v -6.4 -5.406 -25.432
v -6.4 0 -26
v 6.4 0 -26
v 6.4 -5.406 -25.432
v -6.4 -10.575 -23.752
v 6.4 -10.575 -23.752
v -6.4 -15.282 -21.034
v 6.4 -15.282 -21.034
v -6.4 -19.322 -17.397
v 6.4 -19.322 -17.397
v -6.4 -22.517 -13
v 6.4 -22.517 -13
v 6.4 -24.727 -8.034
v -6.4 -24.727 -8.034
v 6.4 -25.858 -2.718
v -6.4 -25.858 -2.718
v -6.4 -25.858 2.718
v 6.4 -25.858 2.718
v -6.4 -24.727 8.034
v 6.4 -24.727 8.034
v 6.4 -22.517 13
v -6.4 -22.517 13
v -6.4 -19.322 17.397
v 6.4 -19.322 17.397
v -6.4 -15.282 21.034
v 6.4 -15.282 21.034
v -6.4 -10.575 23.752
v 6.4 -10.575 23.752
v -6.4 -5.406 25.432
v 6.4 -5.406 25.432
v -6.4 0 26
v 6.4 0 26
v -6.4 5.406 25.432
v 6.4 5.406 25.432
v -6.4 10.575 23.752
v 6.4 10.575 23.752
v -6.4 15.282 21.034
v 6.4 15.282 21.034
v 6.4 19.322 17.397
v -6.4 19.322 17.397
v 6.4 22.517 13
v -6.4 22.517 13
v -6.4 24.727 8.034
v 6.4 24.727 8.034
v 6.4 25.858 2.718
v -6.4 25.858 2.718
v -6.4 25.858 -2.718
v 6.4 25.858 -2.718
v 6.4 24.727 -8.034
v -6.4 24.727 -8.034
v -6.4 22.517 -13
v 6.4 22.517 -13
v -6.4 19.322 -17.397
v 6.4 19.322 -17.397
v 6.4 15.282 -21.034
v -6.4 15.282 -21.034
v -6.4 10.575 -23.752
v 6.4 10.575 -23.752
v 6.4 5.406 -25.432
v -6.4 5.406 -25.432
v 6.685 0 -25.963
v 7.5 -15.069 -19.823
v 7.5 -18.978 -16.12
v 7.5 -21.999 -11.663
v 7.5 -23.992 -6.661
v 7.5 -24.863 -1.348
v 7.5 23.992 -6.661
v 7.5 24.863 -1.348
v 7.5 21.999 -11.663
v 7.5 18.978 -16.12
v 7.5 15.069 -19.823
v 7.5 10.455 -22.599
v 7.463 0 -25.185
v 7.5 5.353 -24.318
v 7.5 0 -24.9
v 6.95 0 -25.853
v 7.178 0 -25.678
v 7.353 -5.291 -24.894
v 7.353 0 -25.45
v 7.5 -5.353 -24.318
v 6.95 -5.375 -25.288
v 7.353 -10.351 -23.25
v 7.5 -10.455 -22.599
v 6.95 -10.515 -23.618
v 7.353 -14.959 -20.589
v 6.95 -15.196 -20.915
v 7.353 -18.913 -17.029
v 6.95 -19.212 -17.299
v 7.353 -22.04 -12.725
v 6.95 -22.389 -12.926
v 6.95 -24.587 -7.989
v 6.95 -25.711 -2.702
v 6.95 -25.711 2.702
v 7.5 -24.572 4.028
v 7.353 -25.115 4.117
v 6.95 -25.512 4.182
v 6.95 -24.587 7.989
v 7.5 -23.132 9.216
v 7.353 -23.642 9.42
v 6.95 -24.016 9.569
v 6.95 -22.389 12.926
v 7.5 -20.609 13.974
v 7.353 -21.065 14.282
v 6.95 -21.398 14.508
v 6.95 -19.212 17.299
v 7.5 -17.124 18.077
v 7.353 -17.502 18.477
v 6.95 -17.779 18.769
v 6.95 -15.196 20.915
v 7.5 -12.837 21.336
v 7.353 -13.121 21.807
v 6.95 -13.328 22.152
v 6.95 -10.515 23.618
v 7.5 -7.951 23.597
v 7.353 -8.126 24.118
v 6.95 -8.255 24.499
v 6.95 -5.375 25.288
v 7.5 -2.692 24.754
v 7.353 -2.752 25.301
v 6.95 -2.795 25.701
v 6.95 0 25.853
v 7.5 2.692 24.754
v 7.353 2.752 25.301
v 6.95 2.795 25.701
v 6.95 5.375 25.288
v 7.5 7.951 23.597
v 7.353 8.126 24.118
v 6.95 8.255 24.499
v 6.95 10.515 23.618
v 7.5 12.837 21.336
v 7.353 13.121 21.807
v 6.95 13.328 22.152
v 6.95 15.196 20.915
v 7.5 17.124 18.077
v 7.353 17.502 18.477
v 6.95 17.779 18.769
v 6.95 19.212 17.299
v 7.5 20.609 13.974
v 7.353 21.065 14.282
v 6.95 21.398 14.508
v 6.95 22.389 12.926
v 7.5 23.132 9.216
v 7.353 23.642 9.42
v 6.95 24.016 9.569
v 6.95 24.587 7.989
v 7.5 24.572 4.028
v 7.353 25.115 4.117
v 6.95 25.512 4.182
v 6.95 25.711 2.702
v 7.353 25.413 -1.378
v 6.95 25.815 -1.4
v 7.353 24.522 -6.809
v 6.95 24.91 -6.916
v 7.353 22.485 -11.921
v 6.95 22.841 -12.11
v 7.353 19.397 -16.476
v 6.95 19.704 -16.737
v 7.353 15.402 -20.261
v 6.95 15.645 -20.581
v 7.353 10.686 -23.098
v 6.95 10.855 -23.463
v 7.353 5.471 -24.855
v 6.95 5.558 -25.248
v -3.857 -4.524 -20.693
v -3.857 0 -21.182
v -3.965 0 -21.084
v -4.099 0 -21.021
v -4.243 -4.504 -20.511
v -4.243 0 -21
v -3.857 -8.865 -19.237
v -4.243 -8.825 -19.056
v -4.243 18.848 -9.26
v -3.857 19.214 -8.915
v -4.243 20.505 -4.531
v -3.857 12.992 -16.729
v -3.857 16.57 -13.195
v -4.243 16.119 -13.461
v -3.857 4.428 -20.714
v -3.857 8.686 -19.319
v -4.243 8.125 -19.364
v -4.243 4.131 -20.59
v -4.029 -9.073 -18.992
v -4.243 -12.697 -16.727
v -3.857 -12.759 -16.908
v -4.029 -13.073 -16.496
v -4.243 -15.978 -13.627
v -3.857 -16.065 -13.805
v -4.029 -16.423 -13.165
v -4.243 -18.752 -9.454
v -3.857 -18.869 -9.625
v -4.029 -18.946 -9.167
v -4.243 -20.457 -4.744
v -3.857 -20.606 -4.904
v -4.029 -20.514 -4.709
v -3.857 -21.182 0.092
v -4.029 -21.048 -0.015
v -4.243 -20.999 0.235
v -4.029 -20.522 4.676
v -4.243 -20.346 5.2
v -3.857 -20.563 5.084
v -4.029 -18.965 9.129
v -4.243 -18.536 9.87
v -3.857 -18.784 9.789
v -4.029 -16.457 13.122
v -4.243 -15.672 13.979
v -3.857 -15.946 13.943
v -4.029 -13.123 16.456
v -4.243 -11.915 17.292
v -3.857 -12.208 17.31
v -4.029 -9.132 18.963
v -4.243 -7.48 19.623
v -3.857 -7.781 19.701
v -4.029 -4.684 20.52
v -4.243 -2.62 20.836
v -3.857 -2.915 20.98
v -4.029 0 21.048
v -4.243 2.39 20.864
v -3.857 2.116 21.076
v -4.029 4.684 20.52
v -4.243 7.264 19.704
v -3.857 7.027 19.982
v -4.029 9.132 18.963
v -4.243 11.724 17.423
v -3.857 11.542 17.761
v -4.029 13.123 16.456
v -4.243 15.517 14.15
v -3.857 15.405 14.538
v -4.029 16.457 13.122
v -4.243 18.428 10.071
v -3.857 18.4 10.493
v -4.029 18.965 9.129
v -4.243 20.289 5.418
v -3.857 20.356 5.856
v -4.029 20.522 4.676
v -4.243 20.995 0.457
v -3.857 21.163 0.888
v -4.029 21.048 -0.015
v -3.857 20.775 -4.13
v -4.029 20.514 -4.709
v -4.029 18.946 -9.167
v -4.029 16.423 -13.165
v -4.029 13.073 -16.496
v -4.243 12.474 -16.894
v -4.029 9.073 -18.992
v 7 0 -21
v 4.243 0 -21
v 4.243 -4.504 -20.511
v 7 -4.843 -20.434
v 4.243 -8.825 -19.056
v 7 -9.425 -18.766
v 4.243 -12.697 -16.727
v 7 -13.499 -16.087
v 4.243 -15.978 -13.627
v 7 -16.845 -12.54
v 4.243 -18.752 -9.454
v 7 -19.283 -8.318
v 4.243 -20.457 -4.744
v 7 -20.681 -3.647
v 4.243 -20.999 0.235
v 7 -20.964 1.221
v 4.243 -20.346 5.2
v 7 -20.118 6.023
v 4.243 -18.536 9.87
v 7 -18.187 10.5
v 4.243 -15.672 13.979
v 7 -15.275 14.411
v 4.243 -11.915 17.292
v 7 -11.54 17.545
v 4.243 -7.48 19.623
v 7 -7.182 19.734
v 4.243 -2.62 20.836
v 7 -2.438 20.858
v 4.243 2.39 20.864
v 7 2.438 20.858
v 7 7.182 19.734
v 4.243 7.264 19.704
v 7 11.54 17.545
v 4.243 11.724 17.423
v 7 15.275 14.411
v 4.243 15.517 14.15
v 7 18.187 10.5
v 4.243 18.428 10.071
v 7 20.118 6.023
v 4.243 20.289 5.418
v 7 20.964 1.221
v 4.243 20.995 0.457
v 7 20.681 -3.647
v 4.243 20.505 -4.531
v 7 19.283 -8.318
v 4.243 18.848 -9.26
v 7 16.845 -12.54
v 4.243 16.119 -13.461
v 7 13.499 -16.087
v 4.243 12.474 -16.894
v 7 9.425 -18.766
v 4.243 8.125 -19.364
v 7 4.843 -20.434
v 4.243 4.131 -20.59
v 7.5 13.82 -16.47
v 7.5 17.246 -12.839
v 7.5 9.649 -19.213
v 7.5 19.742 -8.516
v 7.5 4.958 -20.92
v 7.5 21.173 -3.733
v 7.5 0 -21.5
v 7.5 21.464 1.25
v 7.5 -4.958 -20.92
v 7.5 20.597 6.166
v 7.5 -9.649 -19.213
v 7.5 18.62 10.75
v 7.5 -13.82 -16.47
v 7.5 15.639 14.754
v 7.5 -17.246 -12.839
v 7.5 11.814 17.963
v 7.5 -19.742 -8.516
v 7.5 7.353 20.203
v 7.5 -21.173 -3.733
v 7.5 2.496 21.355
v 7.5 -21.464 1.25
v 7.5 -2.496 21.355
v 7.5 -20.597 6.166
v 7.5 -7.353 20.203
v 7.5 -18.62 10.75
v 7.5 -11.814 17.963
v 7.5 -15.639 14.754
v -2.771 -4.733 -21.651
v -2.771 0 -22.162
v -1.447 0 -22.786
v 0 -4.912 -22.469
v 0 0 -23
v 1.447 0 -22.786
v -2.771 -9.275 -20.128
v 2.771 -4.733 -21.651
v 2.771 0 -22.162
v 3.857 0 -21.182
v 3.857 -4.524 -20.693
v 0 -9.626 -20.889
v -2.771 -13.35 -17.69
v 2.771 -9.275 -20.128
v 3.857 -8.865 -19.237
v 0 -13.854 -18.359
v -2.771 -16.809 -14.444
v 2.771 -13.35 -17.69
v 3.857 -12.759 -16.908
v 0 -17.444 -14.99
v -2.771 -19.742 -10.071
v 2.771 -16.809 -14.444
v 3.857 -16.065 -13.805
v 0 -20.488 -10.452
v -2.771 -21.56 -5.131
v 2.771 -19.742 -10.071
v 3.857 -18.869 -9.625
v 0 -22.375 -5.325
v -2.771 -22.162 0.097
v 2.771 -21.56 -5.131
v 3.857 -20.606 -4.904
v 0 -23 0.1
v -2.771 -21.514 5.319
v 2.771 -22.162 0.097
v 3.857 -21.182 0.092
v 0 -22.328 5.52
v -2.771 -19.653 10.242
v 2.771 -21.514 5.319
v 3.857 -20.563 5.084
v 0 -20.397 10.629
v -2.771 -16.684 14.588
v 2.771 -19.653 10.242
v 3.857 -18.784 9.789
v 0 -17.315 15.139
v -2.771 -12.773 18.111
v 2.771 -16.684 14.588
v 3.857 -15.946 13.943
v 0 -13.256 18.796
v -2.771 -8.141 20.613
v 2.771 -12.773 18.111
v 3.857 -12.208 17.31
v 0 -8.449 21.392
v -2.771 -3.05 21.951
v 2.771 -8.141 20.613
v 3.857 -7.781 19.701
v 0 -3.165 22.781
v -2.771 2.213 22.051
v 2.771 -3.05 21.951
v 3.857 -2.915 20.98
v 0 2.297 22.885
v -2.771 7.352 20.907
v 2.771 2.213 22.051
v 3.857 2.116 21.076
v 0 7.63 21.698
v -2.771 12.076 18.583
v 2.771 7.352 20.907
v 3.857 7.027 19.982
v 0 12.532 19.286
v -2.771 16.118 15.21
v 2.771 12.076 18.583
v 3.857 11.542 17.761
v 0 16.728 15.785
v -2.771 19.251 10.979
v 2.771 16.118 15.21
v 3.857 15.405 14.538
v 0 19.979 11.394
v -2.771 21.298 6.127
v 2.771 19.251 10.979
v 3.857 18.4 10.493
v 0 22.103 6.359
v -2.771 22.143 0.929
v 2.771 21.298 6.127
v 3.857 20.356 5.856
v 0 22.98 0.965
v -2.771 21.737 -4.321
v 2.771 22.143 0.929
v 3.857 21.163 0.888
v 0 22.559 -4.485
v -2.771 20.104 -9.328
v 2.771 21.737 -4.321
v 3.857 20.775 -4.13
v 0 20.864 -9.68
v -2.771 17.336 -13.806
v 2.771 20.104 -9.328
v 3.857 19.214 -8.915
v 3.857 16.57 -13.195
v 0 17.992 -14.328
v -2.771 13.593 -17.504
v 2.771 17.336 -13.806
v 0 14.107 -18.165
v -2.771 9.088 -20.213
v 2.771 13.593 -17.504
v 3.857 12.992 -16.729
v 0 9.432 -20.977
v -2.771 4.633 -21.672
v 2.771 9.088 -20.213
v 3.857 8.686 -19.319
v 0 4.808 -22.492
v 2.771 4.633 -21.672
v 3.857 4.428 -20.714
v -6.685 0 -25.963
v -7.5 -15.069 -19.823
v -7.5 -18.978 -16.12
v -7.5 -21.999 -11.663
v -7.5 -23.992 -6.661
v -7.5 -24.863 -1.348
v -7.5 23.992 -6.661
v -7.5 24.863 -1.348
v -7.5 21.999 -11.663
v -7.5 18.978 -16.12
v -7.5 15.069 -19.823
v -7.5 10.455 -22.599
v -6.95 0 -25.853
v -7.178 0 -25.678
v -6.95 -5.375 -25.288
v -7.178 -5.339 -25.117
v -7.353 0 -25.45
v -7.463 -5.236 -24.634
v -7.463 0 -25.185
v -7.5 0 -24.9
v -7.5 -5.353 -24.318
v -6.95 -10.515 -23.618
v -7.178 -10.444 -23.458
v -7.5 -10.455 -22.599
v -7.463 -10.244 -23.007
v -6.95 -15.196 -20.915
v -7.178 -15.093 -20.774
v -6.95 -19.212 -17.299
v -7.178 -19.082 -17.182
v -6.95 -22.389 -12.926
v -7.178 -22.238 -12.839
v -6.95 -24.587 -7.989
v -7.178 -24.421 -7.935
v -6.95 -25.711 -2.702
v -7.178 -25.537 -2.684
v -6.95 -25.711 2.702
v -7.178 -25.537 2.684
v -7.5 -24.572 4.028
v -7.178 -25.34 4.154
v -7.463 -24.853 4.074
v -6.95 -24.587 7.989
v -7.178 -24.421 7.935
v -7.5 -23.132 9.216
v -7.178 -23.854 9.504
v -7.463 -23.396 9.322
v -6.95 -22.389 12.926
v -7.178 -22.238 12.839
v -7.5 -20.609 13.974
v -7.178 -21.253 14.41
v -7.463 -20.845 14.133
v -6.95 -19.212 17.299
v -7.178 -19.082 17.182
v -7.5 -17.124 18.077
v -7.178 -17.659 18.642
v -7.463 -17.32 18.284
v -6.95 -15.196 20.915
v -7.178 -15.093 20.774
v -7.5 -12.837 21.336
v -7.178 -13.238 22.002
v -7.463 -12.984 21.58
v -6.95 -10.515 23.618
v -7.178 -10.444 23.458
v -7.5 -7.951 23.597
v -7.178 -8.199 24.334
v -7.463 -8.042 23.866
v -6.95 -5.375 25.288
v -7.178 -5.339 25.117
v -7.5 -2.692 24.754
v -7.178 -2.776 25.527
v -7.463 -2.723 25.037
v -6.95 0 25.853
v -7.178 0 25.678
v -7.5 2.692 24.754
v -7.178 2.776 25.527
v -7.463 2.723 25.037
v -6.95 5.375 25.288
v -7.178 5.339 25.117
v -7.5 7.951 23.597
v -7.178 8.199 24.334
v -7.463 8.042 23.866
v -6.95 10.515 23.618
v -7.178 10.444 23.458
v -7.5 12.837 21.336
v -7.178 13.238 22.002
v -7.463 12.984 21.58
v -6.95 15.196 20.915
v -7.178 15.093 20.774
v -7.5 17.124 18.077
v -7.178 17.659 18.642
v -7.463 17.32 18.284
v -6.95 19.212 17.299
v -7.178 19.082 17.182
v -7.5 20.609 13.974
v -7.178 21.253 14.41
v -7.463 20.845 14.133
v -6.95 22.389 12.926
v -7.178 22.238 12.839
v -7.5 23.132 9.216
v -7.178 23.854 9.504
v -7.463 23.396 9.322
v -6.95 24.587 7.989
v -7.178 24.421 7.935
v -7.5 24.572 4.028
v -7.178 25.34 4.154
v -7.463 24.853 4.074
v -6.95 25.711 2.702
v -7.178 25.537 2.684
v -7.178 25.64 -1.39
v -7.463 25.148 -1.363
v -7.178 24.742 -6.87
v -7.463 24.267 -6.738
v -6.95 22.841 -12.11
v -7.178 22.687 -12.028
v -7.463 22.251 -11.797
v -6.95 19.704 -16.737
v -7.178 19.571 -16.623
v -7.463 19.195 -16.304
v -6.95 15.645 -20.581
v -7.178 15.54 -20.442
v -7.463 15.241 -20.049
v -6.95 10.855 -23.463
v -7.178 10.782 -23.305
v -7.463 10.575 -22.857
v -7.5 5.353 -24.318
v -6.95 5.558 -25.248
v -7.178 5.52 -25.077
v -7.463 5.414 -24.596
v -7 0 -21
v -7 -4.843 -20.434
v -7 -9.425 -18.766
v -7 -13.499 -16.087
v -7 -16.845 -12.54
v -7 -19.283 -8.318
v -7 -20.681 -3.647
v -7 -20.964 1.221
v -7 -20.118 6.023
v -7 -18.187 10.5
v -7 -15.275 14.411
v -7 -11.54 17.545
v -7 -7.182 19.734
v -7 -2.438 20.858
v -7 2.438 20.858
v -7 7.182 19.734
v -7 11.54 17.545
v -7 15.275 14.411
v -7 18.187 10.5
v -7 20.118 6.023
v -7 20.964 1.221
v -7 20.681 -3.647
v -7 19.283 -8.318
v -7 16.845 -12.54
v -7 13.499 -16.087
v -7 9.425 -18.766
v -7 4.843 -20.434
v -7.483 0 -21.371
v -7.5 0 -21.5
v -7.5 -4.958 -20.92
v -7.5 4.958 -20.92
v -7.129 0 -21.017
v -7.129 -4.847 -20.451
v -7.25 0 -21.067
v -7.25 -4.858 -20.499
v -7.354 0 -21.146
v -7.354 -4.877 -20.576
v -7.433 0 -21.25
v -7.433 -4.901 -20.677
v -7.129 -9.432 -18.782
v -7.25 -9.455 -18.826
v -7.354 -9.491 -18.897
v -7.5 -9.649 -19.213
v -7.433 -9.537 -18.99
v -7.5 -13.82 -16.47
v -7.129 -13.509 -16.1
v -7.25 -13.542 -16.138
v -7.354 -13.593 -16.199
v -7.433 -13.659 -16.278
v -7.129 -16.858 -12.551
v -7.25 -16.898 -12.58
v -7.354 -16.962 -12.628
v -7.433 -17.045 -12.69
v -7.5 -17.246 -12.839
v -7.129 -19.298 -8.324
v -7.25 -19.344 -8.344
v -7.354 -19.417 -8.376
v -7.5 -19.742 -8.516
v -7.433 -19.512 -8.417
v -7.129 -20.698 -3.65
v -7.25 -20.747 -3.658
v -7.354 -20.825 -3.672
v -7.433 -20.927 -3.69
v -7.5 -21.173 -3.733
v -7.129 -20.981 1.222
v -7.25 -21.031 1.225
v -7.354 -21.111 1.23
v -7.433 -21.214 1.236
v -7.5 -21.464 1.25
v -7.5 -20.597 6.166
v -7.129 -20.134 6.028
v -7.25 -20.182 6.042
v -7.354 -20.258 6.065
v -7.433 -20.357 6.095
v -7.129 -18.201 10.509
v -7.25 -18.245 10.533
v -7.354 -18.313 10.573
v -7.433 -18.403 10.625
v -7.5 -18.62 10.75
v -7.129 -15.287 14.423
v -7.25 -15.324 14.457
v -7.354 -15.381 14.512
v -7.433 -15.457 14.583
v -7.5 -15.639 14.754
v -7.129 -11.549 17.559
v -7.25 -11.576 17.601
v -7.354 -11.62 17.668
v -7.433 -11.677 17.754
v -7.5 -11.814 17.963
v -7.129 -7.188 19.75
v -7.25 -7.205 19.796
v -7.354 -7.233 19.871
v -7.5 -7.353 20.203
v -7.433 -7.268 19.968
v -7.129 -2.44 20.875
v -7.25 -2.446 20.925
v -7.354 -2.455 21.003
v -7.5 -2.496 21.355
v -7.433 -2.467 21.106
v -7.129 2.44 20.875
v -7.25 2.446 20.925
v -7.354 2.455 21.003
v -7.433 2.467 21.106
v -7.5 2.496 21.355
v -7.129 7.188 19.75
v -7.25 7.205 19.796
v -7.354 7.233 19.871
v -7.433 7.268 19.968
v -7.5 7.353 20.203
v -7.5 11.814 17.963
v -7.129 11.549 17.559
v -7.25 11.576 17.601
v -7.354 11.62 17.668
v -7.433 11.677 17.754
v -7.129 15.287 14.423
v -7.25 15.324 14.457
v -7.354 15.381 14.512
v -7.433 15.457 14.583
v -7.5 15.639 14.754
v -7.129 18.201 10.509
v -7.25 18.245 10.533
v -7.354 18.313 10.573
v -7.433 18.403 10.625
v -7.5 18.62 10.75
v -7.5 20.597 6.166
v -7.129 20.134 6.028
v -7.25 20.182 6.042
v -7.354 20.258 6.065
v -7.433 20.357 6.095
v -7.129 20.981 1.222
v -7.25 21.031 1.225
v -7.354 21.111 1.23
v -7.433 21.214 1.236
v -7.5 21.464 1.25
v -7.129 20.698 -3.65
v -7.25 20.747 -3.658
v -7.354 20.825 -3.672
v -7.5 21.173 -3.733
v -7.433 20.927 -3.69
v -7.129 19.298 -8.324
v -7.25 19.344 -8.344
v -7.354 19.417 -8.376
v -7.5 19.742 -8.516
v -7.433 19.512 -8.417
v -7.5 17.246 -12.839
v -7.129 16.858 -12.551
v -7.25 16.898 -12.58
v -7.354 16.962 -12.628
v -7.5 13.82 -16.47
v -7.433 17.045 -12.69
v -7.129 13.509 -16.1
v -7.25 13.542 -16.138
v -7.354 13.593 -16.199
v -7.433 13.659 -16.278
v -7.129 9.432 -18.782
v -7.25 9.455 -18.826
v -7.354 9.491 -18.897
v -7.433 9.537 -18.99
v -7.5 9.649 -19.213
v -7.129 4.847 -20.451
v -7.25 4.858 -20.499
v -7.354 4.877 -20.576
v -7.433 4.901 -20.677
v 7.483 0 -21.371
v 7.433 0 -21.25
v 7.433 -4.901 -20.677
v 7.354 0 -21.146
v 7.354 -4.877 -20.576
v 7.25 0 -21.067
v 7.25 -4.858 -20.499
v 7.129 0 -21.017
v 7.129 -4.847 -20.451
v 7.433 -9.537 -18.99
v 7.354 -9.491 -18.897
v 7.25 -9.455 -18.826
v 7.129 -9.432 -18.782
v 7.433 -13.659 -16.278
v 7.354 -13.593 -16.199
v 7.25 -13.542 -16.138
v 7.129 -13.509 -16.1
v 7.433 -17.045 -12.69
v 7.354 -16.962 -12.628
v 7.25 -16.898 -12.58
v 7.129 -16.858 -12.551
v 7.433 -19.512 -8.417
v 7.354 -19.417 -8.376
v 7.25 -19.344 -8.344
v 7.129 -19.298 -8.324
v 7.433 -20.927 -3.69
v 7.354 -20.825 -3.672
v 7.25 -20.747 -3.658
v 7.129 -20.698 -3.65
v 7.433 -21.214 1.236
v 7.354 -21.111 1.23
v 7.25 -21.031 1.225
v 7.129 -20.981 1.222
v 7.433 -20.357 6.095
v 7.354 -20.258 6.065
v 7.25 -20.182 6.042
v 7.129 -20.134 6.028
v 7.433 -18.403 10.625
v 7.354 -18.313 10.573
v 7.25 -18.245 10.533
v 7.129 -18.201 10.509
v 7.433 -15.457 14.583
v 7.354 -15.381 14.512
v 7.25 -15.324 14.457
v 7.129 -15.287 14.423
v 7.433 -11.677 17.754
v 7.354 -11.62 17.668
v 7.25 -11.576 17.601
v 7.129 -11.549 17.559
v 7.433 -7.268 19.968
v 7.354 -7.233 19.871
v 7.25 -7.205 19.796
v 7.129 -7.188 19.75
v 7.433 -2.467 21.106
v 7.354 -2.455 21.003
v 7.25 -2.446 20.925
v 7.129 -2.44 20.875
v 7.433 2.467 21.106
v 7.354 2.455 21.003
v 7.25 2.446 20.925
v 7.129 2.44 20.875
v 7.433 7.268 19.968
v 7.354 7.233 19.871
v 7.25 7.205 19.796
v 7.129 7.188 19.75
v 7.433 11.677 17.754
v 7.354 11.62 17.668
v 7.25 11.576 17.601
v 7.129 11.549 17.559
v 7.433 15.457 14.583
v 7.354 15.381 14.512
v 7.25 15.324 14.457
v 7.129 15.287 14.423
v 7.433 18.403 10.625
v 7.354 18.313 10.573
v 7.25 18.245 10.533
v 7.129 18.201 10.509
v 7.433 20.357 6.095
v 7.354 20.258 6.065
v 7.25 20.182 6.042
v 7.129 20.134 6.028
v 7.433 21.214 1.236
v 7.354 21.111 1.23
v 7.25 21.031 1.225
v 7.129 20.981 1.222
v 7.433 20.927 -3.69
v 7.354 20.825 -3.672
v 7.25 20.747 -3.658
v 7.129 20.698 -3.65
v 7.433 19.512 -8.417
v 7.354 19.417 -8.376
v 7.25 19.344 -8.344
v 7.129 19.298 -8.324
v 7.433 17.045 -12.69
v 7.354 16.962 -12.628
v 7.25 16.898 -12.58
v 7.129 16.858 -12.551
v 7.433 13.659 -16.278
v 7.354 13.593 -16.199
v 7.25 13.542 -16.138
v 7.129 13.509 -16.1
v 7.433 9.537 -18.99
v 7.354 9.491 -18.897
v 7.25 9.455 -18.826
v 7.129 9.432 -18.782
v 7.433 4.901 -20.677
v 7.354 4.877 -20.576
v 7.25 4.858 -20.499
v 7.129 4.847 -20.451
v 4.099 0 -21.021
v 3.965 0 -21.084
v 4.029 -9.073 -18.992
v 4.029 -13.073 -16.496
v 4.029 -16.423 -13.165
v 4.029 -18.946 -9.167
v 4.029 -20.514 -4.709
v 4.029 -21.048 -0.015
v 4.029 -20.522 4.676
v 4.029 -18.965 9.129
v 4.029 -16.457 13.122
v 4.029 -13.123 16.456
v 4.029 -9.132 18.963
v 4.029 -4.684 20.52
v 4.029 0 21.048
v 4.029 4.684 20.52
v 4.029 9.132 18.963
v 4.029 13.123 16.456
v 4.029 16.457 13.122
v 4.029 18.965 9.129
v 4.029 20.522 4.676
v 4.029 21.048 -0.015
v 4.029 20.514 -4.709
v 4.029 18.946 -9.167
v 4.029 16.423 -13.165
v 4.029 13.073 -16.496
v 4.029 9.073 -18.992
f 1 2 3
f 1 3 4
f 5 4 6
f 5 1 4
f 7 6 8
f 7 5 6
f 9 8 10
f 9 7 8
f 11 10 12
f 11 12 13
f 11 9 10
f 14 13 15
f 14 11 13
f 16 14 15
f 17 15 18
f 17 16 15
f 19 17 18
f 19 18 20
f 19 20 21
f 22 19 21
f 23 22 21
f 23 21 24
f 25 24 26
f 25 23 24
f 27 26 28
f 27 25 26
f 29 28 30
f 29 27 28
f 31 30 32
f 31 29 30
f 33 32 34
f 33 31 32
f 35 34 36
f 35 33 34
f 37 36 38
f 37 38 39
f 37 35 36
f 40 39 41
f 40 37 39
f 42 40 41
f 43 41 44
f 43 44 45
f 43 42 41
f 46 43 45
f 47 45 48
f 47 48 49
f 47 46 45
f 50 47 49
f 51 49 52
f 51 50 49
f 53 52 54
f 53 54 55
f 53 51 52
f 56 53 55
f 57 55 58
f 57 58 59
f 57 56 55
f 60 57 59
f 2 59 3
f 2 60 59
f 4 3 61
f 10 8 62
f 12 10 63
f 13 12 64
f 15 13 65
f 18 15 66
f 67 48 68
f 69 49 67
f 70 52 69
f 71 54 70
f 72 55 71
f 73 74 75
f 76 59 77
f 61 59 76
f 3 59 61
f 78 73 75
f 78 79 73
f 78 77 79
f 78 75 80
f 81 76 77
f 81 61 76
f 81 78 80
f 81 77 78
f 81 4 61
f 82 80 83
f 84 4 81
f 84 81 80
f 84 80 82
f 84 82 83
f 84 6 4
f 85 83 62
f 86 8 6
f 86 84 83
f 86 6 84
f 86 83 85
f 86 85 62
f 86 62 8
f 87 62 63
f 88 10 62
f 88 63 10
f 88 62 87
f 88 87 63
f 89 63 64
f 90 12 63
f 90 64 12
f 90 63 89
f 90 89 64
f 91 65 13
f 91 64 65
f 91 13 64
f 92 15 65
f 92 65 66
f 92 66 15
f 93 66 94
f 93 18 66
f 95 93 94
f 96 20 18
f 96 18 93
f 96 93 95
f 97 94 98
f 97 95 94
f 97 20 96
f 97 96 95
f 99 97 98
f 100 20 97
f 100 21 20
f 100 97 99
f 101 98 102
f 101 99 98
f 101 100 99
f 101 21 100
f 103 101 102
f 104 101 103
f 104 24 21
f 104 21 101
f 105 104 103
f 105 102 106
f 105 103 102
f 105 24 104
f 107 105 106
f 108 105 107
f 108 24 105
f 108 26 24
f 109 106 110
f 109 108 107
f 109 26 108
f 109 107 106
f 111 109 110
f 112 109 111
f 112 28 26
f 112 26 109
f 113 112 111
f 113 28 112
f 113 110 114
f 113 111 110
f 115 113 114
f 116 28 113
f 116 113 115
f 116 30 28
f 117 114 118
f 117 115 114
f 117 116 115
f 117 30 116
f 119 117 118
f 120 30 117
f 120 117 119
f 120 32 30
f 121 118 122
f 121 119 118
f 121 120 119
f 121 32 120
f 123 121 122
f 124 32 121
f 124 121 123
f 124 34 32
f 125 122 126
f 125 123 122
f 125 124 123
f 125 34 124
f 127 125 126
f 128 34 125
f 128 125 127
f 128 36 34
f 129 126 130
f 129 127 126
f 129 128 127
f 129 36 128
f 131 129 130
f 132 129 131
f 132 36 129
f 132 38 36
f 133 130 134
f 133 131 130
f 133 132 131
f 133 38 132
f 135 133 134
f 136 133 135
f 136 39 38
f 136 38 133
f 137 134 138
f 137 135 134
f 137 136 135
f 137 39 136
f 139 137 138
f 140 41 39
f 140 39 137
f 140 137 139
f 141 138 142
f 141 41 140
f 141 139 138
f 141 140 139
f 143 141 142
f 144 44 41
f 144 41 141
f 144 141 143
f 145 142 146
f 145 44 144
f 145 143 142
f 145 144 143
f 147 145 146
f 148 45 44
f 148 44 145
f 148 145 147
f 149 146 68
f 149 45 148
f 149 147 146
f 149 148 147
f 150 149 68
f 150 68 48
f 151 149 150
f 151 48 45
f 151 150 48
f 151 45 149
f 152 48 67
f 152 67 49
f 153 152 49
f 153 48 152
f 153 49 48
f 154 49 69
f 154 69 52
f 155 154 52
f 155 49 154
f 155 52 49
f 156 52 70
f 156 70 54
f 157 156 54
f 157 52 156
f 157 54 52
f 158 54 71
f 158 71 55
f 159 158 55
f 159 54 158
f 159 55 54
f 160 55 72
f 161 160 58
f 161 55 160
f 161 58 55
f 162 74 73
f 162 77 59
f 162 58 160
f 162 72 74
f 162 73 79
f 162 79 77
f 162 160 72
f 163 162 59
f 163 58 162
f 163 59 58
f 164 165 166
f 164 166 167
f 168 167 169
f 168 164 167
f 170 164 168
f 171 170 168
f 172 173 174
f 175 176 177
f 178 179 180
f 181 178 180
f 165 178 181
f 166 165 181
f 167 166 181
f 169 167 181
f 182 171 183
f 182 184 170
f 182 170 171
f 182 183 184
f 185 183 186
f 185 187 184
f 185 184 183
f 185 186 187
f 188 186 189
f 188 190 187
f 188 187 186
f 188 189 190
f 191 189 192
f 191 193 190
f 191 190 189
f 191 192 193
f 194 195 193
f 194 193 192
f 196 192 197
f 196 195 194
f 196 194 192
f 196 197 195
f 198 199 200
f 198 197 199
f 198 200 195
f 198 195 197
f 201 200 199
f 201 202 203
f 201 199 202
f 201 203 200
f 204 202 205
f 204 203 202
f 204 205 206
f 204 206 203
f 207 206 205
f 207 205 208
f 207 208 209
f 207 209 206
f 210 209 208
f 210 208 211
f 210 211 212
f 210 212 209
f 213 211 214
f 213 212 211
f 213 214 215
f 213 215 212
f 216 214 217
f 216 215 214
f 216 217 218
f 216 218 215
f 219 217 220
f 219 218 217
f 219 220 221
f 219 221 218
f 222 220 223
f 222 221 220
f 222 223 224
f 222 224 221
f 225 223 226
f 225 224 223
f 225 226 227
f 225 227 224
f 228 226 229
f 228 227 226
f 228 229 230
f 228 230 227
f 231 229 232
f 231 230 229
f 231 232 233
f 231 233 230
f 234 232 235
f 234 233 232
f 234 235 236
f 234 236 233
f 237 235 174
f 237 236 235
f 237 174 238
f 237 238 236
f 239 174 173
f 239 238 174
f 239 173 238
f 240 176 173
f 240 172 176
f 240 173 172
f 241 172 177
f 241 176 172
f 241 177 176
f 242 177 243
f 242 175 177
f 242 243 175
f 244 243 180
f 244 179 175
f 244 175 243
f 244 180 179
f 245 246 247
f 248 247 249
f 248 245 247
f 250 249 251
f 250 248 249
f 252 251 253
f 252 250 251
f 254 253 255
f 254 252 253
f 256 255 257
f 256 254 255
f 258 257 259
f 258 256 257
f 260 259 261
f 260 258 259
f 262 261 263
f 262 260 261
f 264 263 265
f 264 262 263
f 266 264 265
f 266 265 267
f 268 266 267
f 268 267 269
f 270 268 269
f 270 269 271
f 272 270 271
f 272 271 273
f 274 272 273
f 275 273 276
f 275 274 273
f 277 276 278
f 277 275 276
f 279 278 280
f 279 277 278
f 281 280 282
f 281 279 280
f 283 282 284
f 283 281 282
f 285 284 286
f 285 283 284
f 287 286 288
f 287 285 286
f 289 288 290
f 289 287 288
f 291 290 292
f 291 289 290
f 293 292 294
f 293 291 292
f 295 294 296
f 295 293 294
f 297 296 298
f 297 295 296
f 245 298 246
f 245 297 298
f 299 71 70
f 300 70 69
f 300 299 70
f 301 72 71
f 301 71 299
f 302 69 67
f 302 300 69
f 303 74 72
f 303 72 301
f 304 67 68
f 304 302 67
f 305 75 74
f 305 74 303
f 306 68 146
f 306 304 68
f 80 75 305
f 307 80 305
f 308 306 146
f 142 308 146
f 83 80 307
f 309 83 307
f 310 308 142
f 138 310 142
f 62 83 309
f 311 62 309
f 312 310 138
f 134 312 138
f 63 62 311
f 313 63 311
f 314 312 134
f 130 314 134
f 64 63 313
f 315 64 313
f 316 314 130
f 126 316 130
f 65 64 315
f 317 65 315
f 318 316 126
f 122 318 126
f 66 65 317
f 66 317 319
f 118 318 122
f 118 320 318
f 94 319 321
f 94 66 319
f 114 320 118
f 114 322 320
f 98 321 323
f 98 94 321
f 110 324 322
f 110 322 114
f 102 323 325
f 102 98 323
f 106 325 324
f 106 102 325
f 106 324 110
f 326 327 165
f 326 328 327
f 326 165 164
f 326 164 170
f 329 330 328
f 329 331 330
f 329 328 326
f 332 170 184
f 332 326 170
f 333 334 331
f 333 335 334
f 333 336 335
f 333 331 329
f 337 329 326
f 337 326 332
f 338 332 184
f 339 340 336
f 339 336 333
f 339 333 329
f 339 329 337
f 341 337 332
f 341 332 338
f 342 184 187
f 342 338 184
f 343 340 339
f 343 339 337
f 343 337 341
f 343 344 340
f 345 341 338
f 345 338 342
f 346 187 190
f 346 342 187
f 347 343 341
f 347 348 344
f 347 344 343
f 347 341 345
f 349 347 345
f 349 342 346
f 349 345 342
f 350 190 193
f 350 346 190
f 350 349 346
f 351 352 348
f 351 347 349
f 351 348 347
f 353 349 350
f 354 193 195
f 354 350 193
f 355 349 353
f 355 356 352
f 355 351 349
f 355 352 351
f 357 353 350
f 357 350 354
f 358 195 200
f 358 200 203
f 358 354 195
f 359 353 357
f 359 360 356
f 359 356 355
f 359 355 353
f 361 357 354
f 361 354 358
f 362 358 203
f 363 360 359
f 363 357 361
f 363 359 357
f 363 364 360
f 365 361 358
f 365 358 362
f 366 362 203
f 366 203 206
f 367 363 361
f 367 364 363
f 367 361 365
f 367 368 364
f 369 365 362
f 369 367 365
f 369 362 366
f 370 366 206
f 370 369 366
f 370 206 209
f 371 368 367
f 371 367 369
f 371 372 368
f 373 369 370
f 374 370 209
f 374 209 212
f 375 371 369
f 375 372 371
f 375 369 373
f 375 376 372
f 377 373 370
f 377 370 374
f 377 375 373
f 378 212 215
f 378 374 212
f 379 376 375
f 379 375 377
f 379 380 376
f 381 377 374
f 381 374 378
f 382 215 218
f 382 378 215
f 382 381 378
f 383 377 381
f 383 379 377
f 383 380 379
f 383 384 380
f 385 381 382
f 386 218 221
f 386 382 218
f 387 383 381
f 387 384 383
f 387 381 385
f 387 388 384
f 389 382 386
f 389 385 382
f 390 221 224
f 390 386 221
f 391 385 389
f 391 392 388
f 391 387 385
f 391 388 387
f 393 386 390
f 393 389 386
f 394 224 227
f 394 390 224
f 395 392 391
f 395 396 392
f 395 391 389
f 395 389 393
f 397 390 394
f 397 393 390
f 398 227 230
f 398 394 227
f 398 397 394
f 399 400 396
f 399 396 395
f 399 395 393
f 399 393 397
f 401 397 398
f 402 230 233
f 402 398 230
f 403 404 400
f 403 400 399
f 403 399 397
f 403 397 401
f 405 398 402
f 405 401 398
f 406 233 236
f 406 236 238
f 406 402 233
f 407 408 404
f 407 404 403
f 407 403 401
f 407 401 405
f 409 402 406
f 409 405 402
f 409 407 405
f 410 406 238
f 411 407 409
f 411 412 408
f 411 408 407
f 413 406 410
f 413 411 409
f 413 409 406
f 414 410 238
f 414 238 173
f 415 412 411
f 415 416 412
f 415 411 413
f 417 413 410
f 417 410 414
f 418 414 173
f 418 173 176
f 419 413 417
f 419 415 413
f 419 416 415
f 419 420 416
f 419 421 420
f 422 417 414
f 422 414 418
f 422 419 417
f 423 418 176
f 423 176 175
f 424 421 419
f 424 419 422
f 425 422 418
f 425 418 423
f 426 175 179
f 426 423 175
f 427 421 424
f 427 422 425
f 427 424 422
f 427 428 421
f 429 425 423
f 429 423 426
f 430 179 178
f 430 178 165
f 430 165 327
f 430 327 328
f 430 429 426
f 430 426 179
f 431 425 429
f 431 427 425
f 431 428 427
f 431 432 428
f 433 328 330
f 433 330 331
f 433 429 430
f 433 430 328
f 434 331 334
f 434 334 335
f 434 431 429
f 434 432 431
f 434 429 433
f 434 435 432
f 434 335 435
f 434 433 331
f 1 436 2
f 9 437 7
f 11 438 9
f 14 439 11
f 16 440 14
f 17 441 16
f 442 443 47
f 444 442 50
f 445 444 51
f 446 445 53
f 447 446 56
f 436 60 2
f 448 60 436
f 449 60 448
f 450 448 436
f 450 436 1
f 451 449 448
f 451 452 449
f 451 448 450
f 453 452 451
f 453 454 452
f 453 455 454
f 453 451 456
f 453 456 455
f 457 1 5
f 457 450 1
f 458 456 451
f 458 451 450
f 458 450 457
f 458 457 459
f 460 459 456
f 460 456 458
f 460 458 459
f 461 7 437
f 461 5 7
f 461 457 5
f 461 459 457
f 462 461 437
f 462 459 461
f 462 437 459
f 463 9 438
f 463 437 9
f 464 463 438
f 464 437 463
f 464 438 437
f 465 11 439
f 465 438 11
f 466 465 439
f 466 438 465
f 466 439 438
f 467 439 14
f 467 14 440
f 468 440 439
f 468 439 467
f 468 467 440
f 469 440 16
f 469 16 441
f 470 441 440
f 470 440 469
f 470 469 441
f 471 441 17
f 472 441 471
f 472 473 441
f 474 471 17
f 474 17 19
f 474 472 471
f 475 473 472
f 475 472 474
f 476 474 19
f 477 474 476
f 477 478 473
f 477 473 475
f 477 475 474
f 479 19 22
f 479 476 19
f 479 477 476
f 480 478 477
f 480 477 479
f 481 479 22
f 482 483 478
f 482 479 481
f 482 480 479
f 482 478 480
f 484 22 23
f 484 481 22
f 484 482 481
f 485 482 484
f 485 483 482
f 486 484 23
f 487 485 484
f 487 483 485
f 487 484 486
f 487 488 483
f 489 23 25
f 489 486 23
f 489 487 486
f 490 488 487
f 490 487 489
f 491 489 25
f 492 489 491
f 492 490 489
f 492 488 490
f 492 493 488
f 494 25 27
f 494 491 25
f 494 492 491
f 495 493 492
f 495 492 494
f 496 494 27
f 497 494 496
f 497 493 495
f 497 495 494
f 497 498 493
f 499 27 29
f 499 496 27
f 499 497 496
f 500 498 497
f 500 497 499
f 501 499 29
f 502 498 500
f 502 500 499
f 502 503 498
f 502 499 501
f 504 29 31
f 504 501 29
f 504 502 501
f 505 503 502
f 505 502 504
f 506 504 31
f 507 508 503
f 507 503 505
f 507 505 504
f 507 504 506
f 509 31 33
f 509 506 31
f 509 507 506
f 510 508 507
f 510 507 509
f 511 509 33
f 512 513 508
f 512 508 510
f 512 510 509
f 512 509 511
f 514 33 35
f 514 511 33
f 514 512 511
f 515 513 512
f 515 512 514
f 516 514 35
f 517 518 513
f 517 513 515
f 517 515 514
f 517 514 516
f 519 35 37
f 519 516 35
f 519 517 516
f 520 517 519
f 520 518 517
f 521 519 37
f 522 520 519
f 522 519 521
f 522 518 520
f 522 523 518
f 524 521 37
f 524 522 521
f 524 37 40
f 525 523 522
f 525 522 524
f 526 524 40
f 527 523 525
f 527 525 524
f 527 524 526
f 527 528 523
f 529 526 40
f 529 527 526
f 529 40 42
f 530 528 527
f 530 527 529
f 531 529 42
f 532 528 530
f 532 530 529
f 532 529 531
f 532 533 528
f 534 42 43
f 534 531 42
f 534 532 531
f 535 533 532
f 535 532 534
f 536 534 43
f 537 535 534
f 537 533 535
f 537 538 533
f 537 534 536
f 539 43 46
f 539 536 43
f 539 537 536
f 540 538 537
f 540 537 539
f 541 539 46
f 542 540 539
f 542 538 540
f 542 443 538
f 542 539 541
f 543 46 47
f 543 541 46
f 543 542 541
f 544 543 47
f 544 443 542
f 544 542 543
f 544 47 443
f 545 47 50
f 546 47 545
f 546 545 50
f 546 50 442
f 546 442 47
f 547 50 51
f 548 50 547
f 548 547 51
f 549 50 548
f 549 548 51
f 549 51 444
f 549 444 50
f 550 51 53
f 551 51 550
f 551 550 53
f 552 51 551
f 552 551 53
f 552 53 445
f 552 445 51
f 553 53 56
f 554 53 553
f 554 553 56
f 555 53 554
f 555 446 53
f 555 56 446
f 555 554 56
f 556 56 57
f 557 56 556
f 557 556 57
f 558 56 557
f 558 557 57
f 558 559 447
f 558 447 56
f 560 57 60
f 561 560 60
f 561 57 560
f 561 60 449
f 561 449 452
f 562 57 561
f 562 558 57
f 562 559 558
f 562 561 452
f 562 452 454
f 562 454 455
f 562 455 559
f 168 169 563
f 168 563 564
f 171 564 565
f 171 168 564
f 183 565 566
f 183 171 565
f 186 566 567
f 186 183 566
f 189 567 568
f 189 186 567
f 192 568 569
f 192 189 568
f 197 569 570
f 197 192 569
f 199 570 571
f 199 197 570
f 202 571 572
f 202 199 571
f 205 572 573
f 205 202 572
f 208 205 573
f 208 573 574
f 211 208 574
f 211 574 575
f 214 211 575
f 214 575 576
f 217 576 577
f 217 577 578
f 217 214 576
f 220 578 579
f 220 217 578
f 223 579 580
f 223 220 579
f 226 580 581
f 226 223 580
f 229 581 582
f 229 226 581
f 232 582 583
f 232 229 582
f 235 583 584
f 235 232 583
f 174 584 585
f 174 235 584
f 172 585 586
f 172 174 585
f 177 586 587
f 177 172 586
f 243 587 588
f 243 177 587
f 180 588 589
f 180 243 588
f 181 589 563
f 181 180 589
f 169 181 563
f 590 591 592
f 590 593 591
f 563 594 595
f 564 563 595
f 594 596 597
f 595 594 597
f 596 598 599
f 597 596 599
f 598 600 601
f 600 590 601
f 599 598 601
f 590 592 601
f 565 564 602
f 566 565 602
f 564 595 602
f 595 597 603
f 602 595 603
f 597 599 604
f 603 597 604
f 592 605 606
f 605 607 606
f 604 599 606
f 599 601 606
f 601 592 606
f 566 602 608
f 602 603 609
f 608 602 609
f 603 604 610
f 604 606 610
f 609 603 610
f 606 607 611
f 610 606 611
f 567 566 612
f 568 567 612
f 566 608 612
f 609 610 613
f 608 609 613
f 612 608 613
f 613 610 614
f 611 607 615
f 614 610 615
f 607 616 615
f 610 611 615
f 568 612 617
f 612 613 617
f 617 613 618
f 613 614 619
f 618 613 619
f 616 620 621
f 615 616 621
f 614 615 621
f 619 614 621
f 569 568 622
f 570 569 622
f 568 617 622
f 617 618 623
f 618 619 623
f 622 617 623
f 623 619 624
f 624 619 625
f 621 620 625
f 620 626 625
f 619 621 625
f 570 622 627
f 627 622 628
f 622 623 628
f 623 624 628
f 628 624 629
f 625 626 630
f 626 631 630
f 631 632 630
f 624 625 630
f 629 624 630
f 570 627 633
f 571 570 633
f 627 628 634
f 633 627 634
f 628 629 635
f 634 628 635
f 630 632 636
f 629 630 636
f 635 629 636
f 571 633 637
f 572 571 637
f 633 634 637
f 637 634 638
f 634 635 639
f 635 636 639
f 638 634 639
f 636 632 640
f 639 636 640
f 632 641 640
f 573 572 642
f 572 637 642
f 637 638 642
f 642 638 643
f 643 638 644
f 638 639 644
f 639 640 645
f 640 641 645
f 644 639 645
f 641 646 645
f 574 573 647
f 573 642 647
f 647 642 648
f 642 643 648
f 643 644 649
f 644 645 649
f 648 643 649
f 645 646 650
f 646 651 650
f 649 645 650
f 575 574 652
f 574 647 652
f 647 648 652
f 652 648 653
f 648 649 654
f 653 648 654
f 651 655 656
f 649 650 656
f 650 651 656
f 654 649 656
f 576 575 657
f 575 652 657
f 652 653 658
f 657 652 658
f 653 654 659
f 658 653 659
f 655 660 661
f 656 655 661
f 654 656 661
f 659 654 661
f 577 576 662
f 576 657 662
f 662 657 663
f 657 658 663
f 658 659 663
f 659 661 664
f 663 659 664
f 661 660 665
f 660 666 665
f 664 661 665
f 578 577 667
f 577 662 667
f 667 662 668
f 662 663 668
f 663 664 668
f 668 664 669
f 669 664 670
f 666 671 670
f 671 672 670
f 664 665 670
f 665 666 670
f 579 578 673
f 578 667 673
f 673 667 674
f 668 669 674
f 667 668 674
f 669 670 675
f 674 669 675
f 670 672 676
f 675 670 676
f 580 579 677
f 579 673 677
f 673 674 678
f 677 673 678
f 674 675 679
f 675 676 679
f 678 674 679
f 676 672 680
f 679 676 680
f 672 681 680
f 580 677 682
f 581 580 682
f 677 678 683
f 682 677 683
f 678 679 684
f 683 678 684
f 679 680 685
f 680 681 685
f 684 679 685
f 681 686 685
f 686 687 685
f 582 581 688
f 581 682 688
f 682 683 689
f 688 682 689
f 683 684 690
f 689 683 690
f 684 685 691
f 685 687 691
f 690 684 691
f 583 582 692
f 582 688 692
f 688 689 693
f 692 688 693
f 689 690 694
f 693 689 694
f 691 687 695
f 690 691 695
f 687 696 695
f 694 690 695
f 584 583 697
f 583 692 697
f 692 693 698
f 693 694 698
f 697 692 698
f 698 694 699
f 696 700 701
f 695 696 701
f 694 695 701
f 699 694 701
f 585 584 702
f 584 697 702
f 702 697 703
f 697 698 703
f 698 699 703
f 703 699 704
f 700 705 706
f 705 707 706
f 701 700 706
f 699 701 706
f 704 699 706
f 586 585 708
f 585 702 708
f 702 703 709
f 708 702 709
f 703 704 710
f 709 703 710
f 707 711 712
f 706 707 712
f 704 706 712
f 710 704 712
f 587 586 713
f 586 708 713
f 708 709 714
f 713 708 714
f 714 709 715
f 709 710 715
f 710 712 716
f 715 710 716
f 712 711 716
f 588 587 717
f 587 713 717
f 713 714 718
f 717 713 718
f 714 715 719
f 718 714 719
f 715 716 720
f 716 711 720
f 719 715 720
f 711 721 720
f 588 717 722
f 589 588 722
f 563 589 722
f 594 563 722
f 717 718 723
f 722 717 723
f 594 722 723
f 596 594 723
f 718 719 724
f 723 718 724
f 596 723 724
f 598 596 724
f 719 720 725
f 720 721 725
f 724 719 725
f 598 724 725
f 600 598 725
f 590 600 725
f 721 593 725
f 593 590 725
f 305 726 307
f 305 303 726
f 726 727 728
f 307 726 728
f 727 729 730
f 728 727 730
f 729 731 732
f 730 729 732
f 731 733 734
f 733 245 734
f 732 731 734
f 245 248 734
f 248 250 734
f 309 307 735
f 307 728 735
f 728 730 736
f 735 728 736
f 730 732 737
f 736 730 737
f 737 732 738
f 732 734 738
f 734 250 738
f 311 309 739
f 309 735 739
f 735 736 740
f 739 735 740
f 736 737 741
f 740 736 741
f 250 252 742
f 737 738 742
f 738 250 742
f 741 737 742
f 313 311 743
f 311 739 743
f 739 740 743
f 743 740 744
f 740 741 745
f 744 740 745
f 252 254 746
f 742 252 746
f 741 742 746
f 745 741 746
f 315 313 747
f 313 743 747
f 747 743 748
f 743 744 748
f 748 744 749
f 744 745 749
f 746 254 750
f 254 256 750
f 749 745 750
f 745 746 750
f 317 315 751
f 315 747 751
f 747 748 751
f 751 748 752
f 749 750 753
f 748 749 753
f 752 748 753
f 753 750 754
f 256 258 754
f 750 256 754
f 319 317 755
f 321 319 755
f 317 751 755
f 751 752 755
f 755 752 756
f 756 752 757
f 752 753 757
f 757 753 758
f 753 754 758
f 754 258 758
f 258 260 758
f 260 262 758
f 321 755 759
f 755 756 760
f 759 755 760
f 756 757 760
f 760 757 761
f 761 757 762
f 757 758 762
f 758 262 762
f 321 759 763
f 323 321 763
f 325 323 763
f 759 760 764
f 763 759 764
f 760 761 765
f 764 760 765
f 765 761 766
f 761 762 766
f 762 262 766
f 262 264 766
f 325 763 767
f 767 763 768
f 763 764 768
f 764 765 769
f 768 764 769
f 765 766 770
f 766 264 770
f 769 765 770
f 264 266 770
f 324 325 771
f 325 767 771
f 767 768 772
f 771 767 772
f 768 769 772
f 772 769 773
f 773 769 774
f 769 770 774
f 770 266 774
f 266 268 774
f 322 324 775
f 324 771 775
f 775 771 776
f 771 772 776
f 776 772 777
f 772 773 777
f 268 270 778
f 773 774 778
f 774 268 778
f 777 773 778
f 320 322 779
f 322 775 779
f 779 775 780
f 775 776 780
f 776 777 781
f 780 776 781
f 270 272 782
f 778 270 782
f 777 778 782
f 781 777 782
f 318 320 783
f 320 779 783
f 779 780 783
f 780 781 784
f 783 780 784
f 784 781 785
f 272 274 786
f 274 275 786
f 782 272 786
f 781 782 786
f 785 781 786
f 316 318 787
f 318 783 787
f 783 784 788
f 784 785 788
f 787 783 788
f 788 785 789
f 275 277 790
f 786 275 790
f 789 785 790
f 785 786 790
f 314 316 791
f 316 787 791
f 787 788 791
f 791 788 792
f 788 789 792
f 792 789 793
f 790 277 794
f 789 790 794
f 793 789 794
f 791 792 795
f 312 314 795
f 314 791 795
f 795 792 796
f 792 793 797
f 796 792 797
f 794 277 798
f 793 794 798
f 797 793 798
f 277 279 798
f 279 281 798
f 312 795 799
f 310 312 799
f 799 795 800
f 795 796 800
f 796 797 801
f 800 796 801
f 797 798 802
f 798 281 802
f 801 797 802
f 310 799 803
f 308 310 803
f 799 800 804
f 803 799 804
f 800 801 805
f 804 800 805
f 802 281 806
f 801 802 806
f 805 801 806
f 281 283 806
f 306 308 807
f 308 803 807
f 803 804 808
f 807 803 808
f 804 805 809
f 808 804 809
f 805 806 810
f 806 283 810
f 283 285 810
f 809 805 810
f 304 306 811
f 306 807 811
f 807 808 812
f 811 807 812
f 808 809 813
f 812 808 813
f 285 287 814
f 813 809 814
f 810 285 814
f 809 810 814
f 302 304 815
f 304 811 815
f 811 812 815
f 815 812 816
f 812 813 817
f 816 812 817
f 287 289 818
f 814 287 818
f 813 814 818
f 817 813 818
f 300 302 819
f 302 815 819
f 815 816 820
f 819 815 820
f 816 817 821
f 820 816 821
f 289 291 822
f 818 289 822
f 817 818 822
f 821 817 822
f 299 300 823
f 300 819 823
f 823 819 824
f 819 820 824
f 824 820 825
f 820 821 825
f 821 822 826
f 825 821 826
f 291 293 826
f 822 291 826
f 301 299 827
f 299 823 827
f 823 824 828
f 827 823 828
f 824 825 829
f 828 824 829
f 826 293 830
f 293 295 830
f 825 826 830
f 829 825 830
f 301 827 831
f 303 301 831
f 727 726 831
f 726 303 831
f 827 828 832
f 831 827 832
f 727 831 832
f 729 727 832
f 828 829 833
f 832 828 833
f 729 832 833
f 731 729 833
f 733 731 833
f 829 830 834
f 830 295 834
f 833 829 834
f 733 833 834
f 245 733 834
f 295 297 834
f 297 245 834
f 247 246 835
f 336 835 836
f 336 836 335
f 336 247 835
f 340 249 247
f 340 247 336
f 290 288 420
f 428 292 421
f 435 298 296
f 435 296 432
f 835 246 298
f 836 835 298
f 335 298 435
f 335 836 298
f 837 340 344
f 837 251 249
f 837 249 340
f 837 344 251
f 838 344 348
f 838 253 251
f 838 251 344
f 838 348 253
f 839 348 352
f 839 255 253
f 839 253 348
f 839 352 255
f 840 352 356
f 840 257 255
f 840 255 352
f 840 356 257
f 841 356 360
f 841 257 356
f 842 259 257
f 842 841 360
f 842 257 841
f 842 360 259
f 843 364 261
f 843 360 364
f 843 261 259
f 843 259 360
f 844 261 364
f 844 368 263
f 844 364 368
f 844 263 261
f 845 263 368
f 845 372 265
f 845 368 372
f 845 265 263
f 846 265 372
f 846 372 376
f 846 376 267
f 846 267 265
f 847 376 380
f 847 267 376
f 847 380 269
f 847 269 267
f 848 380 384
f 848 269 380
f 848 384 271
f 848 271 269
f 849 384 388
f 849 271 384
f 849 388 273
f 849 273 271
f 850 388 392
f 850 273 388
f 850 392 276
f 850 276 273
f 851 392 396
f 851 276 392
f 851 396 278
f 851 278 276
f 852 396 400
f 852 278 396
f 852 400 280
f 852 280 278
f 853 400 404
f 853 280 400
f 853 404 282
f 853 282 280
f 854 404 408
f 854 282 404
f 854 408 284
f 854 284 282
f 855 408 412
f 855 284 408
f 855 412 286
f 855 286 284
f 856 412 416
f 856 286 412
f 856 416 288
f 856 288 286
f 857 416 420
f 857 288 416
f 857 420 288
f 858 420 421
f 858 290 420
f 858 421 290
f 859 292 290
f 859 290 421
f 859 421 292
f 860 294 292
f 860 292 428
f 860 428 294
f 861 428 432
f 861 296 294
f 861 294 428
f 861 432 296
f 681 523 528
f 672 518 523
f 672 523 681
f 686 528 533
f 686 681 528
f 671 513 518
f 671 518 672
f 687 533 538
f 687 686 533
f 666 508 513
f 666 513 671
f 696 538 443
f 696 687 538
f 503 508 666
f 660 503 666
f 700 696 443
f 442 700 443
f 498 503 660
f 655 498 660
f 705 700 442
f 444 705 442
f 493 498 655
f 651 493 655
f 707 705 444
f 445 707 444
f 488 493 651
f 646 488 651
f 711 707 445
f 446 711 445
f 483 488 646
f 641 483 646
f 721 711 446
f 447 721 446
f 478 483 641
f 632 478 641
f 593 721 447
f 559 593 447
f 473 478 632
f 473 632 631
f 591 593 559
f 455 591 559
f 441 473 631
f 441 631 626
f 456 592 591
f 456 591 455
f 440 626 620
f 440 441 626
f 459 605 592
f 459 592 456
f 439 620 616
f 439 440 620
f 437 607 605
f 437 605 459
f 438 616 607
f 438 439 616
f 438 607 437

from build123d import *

# Parameters (mm, degrees)
FILLET1_R = 1.1
FILLET2_R = 0.5


with BuildPart() as part:
    # Sketch1 → Revolve1 (revolve)
    with BuildSketch(Plane(origin=(0, 0, 0), x_dir=(-1, 0, 0), z_dir=(0, 1, 0)), mode=Mode.PRIVATE) as revolve1_sk:
        with BuildLine():
            Line((-7.5, 21), (-7.5, 26))
            Line((-7.5, 26), (7.5, 26))
            Line((7.5, 26), (7.5, 21))
            Line((7.5, 21), (4, 21))
            ThreePointArc((4, 21), (0, 23), (-4, 21))
            Line((-4, 21), (-7.5, 21))
        make_face()
    revolve(revolve1_sk.sketch.rotate(Axis((12.943925234, 0, 0), (-1, 0, 0)), 180), axis=Axis((12.943925234, 0, 0), (-1, 0, 0)))

    # Fillet1
    fillet1_edges = [part.edges().sort_by_distance(p)[0] for p in [
        (7.5, 0, 26),
        (-7.5, 0, 26),
    ]]
    fillet(fillet1_edges, radius=FILLET1_R)

    # Fillet2
    fillet2_edges = [part.edges().sort_by_distance(p)[0] for p in [
        (7.5, 0, 21),
        (-7.5, 0, 21),
        (-4, 0, 21),
        (4, 0, 21),
    ]]
    fillet(fillet2_edges, radius=FILLET2_R)


solid = part.part
